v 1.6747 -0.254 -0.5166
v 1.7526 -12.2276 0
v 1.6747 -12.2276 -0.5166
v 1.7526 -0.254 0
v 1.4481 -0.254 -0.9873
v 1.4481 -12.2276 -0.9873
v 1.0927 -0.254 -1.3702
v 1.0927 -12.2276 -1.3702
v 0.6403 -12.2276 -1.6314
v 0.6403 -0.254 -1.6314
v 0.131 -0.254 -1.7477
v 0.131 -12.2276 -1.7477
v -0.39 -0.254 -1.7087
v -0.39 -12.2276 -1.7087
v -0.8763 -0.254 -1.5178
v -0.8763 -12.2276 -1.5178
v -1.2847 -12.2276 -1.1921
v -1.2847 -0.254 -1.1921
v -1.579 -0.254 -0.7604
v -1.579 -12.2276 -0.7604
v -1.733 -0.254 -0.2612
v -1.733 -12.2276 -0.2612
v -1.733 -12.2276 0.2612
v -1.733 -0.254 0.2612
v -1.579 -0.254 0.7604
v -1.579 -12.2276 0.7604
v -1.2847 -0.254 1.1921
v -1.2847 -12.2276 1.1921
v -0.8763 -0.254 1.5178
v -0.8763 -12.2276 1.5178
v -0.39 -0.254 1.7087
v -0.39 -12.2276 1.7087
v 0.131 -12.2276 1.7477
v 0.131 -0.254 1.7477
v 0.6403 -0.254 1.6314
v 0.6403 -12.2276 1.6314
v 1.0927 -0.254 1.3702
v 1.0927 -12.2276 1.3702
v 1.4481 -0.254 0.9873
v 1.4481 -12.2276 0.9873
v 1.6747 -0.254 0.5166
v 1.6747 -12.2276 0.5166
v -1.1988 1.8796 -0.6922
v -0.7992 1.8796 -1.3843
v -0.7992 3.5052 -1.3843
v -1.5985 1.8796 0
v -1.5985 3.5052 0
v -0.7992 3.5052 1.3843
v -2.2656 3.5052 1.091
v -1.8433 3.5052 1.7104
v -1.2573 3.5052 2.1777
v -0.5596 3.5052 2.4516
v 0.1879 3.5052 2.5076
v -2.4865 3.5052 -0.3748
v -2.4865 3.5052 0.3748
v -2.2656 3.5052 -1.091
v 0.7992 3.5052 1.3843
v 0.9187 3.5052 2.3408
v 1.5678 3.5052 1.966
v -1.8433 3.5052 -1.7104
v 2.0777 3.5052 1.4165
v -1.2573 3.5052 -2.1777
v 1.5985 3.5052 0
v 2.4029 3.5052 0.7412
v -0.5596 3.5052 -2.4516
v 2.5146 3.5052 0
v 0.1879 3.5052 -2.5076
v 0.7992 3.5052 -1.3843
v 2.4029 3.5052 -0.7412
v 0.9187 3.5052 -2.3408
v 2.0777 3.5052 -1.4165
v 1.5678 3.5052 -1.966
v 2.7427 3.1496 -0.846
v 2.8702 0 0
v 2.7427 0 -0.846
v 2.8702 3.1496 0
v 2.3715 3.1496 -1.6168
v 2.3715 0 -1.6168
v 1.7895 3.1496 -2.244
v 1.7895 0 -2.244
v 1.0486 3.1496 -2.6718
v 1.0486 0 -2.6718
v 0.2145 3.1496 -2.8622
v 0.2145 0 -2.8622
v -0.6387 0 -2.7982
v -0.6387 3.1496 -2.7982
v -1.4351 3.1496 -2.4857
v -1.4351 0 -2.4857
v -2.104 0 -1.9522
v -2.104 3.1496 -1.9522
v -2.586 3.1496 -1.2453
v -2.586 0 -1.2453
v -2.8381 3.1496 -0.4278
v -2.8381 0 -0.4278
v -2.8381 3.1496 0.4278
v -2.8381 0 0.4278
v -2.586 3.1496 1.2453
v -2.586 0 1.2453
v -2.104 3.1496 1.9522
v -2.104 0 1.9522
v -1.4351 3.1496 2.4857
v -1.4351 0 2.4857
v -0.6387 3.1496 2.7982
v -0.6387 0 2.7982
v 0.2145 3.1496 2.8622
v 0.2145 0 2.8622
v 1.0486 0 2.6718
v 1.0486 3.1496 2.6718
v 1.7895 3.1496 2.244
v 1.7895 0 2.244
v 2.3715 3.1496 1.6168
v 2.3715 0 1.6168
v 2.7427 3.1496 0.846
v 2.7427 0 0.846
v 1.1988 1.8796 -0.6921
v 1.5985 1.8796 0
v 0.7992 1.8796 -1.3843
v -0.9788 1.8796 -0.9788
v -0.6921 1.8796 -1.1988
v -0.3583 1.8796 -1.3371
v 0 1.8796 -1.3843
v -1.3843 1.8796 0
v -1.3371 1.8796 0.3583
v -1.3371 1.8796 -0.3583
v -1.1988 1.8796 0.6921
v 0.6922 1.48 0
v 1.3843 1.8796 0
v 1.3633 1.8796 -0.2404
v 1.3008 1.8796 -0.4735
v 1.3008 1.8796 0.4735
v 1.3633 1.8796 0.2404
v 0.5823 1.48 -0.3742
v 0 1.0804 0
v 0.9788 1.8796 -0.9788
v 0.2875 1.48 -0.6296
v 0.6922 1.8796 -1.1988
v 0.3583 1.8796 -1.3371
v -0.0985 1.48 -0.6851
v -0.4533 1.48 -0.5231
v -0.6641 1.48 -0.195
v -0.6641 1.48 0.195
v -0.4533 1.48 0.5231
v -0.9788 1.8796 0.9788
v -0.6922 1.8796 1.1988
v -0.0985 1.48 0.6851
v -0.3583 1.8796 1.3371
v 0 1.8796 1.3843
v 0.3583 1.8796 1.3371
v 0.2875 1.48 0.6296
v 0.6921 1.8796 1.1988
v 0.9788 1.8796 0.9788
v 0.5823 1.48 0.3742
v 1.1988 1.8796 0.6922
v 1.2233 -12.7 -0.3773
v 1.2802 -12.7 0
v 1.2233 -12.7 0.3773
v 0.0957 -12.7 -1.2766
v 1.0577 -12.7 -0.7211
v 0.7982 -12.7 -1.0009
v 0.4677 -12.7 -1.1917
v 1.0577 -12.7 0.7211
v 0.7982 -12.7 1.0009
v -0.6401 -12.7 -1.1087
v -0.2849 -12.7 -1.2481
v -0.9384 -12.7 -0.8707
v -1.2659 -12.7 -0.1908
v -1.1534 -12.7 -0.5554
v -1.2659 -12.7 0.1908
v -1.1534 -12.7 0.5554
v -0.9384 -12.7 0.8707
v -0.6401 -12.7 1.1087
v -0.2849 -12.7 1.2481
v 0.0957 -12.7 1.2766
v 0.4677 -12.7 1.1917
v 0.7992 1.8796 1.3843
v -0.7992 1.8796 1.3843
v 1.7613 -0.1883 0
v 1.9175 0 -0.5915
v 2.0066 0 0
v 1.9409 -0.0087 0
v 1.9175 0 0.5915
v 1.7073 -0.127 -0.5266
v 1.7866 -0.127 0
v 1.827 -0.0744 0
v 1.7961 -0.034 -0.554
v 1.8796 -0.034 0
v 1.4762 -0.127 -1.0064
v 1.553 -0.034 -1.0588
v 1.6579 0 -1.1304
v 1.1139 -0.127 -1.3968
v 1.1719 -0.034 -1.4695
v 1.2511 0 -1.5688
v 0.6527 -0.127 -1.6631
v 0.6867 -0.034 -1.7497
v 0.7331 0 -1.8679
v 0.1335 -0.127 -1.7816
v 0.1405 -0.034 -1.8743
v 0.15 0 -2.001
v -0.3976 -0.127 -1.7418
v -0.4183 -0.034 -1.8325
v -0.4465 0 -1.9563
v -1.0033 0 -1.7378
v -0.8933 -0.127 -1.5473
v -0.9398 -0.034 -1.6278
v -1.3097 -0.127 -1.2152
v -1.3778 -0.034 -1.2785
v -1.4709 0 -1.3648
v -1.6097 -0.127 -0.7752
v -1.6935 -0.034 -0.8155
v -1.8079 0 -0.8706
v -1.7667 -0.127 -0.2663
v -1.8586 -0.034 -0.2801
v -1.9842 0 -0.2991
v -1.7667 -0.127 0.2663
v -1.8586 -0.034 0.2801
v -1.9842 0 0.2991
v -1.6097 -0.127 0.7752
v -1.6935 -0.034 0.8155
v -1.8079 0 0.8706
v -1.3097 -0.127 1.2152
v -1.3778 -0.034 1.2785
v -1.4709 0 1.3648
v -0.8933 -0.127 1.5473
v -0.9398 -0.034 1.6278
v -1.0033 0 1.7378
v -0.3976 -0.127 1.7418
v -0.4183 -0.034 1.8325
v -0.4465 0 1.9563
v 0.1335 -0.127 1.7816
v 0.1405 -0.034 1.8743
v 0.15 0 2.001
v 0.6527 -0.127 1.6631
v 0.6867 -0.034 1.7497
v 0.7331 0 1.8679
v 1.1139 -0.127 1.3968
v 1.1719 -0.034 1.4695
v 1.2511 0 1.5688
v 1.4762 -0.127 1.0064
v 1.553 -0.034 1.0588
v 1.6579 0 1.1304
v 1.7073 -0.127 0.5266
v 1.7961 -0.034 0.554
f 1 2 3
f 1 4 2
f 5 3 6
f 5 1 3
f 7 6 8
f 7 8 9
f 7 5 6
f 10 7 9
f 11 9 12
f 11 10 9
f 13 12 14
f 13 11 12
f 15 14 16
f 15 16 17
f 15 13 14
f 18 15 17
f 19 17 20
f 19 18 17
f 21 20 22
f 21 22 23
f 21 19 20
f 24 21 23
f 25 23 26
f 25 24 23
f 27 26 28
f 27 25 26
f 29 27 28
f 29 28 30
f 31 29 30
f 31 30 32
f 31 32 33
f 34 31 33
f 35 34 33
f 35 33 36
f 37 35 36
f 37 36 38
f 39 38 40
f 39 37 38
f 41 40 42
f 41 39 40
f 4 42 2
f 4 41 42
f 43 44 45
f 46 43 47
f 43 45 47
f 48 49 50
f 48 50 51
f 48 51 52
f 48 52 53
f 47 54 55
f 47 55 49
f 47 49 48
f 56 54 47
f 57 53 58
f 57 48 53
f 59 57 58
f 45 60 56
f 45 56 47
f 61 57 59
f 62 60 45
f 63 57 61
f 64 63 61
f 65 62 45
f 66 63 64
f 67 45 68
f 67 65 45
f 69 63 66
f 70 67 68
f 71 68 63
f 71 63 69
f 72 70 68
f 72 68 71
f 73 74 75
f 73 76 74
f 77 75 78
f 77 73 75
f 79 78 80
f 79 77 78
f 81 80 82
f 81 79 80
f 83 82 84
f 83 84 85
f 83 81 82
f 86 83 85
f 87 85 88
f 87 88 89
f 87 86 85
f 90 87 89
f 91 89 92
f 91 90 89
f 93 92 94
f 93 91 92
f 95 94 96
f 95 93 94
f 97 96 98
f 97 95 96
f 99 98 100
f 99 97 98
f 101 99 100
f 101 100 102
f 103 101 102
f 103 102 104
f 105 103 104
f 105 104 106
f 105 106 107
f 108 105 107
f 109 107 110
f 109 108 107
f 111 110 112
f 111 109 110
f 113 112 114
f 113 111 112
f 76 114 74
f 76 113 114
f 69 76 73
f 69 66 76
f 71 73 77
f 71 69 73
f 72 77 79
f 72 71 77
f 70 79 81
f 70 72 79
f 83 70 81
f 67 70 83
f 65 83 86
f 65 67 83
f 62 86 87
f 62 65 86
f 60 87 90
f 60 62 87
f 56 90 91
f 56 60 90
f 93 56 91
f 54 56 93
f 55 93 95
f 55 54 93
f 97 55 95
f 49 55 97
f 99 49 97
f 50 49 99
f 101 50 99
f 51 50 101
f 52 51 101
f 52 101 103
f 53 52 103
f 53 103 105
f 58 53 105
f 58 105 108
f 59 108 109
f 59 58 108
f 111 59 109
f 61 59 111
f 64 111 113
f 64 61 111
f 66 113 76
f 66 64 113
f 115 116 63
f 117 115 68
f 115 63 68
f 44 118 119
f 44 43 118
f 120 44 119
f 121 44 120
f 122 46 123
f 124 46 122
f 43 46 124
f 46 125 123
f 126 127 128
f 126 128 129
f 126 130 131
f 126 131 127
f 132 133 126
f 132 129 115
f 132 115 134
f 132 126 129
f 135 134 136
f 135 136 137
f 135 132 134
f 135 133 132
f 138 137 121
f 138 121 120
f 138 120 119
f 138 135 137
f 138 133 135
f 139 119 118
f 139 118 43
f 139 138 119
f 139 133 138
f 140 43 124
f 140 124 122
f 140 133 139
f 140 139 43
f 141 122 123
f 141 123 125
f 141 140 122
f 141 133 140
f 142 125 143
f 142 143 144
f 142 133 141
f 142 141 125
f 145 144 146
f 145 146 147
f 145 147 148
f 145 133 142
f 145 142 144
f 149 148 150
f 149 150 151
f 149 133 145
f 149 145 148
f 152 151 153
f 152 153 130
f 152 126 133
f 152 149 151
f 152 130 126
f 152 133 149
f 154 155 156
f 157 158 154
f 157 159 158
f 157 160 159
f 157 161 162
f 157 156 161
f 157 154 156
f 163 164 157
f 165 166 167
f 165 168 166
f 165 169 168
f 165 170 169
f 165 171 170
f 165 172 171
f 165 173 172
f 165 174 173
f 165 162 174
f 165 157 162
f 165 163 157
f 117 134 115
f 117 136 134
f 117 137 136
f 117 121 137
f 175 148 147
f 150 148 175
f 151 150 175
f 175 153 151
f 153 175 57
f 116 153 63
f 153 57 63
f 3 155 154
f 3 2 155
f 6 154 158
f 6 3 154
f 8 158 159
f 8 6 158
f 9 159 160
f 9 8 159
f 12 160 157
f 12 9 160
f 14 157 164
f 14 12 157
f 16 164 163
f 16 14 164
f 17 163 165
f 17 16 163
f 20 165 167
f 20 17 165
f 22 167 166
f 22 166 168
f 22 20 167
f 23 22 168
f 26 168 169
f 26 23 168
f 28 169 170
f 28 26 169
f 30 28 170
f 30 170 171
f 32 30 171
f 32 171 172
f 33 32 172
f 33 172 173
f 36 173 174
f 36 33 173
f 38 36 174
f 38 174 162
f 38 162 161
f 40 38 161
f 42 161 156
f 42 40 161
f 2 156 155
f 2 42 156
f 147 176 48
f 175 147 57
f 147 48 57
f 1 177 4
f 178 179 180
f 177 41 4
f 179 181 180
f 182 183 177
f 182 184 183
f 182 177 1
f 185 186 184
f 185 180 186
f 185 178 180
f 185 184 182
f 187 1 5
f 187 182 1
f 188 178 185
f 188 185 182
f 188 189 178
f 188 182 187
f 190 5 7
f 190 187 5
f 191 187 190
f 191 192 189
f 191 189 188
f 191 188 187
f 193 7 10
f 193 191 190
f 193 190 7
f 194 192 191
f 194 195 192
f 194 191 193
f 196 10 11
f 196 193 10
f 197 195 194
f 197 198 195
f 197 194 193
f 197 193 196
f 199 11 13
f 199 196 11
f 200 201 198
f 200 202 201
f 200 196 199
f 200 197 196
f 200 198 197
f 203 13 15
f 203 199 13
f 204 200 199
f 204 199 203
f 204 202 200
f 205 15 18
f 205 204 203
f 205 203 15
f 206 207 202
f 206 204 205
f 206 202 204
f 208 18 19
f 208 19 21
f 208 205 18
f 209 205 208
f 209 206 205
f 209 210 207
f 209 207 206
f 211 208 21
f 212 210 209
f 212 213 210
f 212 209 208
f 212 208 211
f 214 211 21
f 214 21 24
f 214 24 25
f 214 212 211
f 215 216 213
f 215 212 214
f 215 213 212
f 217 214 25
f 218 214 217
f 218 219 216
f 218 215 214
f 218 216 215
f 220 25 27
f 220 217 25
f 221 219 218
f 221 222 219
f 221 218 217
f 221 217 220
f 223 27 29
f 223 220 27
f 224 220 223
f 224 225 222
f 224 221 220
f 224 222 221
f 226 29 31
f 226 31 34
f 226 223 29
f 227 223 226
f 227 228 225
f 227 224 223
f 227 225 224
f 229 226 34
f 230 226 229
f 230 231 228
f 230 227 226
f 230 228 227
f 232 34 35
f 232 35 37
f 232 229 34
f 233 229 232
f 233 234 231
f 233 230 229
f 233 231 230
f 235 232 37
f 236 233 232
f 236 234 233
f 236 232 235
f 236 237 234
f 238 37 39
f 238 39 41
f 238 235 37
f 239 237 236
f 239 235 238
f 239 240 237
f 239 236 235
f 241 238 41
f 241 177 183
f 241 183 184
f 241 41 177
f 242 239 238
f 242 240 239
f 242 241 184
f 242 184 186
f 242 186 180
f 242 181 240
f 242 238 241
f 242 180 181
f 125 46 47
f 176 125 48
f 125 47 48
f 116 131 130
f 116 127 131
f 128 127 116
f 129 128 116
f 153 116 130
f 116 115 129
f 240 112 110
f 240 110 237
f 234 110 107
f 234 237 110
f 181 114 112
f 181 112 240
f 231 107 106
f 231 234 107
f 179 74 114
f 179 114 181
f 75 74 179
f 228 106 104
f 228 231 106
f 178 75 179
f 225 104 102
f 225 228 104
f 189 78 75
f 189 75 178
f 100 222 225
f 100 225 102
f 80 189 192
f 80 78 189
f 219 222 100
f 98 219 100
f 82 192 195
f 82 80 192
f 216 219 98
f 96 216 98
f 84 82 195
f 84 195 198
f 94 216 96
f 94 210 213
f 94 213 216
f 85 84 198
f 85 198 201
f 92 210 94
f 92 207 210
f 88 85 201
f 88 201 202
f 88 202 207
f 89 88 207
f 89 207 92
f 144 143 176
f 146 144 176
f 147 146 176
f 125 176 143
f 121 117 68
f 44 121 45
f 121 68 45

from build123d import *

# Parameters (mm, degrees)
CUT_EXTRUDE1_DEPTH = 1.6256


with BuildPart() as part:
    # Sketch5 → Revolve2 (revolve)
    with BuildSketch(Plane.XY):
        with BuildLine():
            Line((0, 1.080374022), (0, -12.7))
            Line((0, -12.7), (1.28016, -12.7))
            Line((1.28016, -12.7), (1.7526, -12.22756))
            Line((1.7526, -12.22756), (1.7526, -0.254))
            ThreePointArc((1.7526, -0.254), (1.826994878, -0.074394878), (2.0066, 0))
            Line((2.0066, 0), (2.8702, 0))
            Line((2.8702, 0), (2.8702, 3.1496))
            Line((2.8702, 3.1496), (2.5146, 3.5052))
            Line((2.5146, 3.5052), (1.3843, 3.5052))
            Line((1.3843, 3.5052), (1.3843, 1.8796))
            Line((1.3843, 1.8796), (0, 1.080374022))
        make_face()
    revolve(axis=Axis((0, 3.5052, 0), (0, 1, 0)))

    # Sketch3 → Cut-Extrude1 (cut)
    with BuildSketch(Plane(origin=(0, 3.5052, 0), x_dir=(1, 0, 0), z_dir=(0, 1, 0))):
        Polygon((-1.598451955, 0), (-0.799225978, -1.3843), (0.799225978, -1.3843), (1.598451955, 0), (0.799225978, 1.3843), (-0.799225978, 1.3843), align=None)
    extrude(amount=-CUT_EXTRUDE1_DEPTH, mode=Mode.SUBTRACT)


solid = part.part
